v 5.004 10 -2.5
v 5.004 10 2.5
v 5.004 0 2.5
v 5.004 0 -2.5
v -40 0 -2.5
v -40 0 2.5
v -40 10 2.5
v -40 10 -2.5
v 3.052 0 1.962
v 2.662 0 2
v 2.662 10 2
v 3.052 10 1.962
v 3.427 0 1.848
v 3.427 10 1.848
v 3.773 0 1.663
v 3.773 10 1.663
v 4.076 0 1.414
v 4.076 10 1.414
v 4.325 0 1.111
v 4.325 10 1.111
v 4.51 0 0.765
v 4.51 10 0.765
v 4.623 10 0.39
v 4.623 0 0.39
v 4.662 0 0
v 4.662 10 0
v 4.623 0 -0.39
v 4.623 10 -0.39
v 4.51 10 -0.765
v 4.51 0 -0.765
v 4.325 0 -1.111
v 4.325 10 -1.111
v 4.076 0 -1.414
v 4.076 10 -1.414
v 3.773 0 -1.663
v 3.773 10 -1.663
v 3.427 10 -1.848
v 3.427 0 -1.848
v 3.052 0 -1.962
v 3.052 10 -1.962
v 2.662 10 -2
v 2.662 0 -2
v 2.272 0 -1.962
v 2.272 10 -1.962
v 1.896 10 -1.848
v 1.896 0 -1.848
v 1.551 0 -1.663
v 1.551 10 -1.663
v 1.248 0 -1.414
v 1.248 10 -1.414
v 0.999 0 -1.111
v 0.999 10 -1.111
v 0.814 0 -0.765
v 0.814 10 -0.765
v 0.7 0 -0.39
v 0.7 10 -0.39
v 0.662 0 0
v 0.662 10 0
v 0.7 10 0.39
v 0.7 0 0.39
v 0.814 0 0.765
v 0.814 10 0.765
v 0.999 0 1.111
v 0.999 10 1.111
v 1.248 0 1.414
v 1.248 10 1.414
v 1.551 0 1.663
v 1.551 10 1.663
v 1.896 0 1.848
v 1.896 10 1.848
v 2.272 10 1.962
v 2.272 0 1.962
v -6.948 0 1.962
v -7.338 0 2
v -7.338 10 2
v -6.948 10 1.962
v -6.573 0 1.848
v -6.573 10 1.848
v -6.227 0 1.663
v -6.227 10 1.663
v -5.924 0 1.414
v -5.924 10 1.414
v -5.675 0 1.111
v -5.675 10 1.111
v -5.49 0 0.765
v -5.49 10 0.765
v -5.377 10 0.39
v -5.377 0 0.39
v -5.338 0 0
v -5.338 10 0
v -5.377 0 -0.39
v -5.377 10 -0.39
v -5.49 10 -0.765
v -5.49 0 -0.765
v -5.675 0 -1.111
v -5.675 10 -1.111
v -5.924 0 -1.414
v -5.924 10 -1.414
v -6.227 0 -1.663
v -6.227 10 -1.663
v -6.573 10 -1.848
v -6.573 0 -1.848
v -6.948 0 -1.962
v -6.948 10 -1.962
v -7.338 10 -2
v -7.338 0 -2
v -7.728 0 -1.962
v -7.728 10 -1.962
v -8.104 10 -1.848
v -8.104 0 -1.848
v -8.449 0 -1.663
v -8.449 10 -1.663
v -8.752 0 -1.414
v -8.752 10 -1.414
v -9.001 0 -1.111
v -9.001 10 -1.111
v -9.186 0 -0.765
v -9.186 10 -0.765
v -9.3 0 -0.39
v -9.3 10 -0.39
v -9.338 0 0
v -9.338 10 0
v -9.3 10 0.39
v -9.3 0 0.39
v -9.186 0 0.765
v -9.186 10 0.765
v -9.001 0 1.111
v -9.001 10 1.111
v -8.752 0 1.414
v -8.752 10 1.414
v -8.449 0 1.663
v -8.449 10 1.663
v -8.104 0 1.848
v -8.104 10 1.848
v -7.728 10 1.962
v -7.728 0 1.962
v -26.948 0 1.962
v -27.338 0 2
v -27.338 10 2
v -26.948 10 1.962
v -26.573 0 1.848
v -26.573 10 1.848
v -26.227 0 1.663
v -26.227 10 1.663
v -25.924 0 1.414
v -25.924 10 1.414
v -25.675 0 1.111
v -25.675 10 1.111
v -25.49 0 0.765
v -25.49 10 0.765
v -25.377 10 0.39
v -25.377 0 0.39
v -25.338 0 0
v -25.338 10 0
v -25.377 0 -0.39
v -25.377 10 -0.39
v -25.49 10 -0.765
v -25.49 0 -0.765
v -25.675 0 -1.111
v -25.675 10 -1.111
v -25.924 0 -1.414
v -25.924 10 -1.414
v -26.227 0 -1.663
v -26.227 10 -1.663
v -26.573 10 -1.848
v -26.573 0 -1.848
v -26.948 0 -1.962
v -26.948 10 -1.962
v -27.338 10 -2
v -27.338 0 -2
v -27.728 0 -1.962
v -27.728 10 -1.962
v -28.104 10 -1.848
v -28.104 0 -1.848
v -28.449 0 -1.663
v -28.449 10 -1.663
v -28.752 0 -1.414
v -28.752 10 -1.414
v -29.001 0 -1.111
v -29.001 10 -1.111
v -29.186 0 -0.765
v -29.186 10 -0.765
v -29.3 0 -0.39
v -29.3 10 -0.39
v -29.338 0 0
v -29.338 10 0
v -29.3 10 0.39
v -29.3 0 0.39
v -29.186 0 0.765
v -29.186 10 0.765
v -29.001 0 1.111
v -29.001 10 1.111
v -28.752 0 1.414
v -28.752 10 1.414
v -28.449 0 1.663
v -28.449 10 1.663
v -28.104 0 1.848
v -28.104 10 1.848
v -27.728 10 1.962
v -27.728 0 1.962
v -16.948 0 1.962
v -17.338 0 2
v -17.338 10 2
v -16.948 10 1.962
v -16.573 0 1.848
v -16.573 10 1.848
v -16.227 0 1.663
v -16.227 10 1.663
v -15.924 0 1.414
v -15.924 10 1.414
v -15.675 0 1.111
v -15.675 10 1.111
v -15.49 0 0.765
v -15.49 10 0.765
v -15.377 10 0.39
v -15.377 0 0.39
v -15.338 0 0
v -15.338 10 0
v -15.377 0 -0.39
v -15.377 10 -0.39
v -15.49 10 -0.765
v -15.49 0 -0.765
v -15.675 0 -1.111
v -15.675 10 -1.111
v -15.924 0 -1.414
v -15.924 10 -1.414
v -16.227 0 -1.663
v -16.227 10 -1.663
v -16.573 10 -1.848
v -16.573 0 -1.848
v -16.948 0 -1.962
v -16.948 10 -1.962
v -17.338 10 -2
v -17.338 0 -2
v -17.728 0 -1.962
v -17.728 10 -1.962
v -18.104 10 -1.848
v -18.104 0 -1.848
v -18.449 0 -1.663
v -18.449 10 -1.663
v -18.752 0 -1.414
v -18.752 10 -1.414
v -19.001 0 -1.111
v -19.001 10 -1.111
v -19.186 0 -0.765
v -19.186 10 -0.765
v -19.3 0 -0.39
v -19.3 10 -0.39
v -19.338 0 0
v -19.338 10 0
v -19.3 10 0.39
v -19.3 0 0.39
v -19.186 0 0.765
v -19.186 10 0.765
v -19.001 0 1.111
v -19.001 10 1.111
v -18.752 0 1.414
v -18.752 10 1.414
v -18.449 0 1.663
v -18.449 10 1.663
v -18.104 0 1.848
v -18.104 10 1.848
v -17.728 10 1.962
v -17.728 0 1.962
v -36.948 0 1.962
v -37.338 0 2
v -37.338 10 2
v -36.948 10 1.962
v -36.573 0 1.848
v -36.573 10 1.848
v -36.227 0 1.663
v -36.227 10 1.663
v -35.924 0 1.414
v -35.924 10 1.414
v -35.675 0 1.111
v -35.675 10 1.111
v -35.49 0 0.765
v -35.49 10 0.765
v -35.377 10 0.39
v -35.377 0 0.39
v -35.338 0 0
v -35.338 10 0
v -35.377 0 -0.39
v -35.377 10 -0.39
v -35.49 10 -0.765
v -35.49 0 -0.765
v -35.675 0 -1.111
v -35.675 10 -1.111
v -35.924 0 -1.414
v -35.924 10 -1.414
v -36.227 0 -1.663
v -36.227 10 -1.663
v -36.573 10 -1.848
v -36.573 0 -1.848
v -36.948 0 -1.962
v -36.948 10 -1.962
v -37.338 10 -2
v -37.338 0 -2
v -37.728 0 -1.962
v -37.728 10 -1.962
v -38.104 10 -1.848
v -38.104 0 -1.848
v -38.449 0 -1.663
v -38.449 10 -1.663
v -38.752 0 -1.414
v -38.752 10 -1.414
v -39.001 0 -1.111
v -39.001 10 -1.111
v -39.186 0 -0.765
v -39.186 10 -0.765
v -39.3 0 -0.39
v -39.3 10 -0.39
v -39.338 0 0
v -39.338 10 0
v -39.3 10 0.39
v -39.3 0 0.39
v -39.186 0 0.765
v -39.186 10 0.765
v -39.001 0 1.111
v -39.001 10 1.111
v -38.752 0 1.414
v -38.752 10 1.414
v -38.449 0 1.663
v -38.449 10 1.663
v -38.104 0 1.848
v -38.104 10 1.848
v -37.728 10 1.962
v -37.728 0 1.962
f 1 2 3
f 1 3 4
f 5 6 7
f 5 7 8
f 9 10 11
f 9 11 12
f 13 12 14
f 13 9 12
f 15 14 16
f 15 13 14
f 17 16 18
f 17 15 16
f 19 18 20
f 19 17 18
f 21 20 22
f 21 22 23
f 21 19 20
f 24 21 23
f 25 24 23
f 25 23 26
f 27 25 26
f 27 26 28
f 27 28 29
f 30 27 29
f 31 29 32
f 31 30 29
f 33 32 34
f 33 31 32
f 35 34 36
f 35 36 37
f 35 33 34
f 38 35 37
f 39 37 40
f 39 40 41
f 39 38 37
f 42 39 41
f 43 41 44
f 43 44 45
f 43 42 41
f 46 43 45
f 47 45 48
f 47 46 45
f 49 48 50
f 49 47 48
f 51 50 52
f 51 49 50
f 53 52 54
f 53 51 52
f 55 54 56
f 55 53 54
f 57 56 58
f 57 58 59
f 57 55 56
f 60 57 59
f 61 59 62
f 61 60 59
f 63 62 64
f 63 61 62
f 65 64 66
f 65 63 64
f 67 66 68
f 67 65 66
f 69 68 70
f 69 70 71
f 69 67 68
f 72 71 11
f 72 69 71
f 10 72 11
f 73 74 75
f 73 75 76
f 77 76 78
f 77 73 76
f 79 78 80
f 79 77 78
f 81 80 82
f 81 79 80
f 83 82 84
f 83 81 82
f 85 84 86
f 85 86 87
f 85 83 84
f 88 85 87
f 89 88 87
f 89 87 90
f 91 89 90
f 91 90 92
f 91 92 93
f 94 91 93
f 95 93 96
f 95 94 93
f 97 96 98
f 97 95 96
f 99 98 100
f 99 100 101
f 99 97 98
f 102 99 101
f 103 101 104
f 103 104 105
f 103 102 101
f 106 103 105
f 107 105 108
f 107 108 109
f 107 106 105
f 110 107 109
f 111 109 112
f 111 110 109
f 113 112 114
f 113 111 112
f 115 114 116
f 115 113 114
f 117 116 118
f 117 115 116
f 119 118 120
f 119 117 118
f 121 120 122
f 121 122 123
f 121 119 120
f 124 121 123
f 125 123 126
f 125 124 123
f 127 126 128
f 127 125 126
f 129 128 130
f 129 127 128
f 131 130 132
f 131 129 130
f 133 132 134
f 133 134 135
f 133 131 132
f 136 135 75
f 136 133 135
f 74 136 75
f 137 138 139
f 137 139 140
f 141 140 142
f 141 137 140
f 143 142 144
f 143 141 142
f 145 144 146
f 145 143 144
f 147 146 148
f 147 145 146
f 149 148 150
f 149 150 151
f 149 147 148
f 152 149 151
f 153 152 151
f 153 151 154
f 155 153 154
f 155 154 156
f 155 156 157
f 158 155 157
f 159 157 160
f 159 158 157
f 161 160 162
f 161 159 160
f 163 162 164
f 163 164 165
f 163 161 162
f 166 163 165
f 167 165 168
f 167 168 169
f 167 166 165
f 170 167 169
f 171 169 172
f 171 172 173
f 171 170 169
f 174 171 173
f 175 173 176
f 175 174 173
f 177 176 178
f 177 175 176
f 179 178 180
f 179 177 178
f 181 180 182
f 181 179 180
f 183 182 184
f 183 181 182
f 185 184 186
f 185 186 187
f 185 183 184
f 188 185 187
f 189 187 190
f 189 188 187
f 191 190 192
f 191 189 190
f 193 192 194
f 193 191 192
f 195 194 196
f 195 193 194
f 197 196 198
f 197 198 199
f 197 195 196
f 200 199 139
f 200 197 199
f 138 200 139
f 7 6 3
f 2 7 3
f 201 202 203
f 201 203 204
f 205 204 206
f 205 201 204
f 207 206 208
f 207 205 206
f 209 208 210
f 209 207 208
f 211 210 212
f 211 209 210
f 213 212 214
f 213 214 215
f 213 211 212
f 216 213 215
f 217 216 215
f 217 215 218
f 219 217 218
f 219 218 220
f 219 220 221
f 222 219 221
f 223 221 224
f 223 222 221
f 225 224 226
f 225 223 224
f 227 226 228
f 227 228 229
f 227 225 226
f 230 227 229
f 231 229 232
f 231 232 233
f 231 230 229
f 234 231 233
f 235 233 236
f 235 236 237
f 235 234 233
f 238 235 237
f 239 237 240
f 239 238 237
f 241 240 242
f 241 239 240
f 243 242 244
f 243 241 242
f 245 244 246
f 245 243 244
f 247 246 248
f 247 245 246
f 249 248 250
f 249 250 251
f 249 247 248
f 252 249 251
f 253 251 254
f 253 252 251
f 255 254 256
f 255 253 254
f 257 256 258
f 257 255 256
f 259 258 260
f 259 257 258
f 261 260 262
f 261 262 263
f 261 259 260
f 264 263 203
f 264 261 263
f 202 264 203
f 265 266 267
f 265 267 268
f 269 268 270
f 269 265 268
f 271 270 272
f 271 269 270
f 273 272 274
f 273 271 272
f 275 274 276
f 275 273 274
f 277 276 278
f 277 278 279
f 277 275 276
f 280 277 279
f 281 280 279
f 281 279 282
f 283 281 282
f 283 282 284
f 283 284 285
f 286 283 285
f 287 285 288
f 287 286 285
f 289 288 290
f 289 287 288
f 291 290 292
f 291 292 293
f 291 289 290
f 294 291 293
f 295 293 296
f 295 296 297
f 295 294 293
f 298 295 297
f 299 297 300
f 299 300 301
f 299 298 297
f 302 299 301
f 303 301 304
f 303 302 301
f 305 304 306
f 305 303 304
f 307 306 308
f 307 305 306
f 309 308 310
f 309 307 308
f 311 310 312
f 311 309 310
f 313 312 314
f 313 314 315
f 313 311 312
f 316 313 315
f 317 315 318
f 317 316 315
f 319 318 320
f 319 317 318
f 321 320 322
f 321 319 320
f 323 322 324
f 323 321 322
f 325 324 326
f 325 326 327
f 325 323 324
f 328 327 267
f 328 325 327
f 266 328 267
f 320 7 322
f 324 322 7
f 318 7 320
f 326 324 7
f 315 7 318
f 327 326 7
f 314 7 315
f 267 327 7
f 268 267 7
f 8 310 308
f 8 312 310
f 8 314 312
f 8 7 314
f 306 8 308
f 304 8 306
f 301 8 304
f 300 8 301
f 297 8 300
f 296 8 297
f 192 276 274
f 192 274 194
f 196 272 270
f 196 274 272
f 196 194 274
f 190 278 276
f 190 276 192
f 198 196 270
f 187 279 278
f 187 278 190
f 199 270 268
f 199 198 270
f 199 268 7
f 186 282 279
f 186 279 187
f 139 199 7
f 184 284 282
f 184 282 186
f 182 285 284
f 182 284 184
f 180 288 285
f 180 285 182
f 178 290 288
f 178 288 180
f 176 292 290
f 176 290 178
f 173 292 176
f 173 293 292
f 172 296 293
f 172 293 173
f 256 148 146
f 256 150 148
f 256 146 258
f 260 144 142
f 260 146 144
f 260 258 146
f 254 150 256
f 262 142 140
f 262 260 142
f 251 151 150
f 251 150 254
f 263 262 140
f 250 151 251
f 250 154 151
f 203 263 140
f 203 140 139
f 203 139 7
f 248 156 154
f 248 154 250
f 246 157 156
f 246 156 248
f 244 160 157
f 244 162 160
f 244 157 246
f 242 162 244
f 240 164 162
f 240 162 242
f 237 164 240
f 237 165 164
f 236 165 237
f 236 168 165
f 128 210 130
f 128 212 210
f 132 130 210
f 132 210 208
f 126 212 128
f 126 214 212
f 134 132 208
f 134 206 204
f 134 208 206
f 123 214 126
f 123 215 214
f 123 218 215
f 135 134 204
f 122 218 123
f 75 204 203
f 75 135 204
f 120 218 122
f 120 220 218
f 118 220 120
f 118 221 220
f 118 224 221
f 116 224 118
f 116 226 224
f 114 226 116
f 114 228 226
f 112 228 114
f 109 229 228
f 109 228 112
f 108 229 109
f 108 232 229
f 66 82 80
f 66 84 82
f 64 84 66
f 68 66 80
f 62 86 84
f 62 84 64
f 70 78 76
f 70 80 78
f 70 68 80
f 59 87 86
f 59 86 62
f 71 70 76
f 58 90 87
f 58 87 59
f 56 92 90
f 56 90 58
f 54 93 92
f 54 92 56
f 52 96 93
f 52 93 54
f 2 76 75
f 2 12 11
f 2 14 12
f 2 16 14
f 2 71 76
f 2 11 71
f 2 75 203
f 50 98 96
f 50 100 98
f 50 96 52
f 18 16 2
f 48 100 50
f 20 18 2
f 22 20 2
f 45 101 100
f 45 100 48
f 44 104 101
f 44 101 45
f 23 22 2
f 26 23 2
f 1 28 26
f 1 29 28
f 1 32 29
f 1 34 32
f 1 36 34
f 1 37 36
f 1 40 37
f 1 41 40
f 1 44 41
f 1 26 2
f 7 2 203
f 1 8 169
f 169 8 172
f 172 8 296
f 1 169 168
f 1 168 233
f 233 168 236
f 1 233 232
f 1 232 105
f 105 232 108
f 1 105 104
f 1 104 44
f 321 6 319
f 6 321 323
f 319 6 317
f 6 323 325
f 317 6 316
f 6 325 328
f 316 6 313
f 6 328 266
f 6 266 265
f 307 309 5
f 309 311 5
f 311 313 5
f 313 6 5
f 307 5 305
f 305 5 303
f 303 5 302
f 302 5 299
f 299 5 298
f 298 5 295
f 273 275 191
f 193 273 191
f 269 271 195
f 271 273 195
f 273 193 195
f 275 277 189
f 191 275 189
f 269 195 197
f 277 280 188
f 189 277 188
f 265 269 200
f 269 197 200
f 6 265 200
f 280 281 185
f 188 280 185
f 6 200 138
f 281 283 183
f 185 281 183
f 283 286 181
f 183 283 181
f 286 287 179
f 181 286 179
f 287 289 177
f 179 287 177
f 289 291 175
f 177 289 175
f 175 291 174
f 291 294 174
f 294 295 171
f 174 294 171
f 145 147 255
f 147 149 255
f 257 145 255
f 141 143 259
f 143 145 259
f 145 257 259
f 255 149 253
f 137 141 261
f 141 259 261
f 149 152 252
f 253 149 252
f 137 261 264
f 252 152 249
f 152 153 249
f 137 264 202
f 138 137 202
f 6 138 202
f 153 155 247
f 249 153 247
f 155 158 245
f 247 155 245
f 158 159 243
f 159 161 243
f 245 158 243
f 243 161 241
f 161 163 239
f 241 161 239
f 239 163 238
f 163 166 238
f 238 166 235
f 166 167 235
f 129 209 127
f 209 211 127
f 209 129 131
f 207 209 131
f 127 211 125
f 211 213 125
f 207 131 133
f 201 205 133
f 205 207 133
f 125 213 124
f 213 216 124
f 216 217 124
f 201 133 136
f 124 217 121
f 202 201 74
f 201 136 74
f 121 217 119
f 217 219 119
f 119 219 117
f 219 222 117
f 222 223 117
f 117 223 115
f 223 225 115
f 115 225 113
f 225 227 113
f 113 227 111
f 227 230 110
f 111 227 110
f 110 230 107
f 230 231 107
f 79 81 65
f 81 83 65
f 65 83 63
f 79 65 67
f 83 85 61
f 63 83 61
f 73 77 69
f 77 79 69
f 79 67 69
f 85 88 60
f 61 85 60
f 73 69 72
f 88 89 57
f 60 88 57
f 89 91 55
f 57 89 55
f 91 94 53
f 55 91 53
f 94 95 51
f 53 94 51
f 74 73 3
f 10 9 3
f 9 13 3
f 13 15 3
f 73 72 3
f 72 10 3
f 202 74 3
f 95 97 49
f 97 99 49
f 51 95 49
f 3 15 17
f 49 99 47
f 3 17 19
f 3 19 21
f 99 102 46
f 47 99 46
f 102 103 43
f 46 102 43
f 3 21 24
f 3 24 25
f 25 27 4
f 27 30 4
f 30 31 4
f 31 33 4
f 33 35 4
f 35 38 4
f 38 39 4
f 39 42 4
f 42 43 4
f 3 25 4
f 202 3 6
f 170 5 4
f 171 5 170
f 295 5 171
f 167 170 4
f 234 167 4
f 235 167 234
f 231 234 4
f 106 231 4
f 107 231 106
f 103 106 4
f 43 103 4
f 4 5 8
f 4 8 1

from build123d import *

# Parameters (mm, degrees)
SKETCH_1_W          = 50
SKETCH_1_H          = 5
SKETCH_1_R          = 2
EXTRUDE_1_DEPTH     = 10
SKETCH_2_W          = 4.996058956
SKETCH_2_H          = 5
CUT_EXTRUDE_1_DEPTH = 10


with BuildPart() as part:
    # 草图1 → 凸台-拉伸1 (new body)
    with BuildSketch(Plane(origin=(0, 0, 0), x_dir=(1, 0, 0), z_dir=(0, 1, 0))):
        with Locations((-15, 0)):
            Rectangle(SKETCH_1_W, SKETCH_1_H)
        with Locations(Location((-37.33819922, 0, 0), (0, 0, 270))):
            Circle(SKETCH_1_R, mode=Mode.SUBTRACT)
        with Locations(Location((-27.33819922, 0, 0), (0, 0, 270))):
            Circle(SKETCH_1_R, mode=Mode.SUBTRACT)
        with Locations(Location((-17.33819922, 0, 0), (0, 0, 270))):
            Circle(SKETCH_1_R, mode=Mode.SUBTRACT)
        with Locations(Location((-7.33819922, 0, 0), (0, 0, 270))):
            Circle(SKETCH_1_R, mode=Mode.SUBTRACT)
        with Locations(Location((2.66180078, 0, 0), (0, 0, 270))):
            Circle(SKETCH_1_R, mode=Mode.SUBTRACT)
    extrude(amount=EXTRUDE_1_DEPTH)

    # 草图2 → 切除-拉伸1 (cut)
    with BuildSketch(Plane(origin=(0, 10, 0), x_dir=(1, 0, 0), z_dir=(0, 1, 0))):
        with Locations((7.501970522, 0)):
            Rectangle(SKETCH_2_W, SKETCH_2_H)
    extrude(amount=-CUT_EXTRUDE_1_DEPTH, mode=Mode.SUBTRACT)


solid = part.part
